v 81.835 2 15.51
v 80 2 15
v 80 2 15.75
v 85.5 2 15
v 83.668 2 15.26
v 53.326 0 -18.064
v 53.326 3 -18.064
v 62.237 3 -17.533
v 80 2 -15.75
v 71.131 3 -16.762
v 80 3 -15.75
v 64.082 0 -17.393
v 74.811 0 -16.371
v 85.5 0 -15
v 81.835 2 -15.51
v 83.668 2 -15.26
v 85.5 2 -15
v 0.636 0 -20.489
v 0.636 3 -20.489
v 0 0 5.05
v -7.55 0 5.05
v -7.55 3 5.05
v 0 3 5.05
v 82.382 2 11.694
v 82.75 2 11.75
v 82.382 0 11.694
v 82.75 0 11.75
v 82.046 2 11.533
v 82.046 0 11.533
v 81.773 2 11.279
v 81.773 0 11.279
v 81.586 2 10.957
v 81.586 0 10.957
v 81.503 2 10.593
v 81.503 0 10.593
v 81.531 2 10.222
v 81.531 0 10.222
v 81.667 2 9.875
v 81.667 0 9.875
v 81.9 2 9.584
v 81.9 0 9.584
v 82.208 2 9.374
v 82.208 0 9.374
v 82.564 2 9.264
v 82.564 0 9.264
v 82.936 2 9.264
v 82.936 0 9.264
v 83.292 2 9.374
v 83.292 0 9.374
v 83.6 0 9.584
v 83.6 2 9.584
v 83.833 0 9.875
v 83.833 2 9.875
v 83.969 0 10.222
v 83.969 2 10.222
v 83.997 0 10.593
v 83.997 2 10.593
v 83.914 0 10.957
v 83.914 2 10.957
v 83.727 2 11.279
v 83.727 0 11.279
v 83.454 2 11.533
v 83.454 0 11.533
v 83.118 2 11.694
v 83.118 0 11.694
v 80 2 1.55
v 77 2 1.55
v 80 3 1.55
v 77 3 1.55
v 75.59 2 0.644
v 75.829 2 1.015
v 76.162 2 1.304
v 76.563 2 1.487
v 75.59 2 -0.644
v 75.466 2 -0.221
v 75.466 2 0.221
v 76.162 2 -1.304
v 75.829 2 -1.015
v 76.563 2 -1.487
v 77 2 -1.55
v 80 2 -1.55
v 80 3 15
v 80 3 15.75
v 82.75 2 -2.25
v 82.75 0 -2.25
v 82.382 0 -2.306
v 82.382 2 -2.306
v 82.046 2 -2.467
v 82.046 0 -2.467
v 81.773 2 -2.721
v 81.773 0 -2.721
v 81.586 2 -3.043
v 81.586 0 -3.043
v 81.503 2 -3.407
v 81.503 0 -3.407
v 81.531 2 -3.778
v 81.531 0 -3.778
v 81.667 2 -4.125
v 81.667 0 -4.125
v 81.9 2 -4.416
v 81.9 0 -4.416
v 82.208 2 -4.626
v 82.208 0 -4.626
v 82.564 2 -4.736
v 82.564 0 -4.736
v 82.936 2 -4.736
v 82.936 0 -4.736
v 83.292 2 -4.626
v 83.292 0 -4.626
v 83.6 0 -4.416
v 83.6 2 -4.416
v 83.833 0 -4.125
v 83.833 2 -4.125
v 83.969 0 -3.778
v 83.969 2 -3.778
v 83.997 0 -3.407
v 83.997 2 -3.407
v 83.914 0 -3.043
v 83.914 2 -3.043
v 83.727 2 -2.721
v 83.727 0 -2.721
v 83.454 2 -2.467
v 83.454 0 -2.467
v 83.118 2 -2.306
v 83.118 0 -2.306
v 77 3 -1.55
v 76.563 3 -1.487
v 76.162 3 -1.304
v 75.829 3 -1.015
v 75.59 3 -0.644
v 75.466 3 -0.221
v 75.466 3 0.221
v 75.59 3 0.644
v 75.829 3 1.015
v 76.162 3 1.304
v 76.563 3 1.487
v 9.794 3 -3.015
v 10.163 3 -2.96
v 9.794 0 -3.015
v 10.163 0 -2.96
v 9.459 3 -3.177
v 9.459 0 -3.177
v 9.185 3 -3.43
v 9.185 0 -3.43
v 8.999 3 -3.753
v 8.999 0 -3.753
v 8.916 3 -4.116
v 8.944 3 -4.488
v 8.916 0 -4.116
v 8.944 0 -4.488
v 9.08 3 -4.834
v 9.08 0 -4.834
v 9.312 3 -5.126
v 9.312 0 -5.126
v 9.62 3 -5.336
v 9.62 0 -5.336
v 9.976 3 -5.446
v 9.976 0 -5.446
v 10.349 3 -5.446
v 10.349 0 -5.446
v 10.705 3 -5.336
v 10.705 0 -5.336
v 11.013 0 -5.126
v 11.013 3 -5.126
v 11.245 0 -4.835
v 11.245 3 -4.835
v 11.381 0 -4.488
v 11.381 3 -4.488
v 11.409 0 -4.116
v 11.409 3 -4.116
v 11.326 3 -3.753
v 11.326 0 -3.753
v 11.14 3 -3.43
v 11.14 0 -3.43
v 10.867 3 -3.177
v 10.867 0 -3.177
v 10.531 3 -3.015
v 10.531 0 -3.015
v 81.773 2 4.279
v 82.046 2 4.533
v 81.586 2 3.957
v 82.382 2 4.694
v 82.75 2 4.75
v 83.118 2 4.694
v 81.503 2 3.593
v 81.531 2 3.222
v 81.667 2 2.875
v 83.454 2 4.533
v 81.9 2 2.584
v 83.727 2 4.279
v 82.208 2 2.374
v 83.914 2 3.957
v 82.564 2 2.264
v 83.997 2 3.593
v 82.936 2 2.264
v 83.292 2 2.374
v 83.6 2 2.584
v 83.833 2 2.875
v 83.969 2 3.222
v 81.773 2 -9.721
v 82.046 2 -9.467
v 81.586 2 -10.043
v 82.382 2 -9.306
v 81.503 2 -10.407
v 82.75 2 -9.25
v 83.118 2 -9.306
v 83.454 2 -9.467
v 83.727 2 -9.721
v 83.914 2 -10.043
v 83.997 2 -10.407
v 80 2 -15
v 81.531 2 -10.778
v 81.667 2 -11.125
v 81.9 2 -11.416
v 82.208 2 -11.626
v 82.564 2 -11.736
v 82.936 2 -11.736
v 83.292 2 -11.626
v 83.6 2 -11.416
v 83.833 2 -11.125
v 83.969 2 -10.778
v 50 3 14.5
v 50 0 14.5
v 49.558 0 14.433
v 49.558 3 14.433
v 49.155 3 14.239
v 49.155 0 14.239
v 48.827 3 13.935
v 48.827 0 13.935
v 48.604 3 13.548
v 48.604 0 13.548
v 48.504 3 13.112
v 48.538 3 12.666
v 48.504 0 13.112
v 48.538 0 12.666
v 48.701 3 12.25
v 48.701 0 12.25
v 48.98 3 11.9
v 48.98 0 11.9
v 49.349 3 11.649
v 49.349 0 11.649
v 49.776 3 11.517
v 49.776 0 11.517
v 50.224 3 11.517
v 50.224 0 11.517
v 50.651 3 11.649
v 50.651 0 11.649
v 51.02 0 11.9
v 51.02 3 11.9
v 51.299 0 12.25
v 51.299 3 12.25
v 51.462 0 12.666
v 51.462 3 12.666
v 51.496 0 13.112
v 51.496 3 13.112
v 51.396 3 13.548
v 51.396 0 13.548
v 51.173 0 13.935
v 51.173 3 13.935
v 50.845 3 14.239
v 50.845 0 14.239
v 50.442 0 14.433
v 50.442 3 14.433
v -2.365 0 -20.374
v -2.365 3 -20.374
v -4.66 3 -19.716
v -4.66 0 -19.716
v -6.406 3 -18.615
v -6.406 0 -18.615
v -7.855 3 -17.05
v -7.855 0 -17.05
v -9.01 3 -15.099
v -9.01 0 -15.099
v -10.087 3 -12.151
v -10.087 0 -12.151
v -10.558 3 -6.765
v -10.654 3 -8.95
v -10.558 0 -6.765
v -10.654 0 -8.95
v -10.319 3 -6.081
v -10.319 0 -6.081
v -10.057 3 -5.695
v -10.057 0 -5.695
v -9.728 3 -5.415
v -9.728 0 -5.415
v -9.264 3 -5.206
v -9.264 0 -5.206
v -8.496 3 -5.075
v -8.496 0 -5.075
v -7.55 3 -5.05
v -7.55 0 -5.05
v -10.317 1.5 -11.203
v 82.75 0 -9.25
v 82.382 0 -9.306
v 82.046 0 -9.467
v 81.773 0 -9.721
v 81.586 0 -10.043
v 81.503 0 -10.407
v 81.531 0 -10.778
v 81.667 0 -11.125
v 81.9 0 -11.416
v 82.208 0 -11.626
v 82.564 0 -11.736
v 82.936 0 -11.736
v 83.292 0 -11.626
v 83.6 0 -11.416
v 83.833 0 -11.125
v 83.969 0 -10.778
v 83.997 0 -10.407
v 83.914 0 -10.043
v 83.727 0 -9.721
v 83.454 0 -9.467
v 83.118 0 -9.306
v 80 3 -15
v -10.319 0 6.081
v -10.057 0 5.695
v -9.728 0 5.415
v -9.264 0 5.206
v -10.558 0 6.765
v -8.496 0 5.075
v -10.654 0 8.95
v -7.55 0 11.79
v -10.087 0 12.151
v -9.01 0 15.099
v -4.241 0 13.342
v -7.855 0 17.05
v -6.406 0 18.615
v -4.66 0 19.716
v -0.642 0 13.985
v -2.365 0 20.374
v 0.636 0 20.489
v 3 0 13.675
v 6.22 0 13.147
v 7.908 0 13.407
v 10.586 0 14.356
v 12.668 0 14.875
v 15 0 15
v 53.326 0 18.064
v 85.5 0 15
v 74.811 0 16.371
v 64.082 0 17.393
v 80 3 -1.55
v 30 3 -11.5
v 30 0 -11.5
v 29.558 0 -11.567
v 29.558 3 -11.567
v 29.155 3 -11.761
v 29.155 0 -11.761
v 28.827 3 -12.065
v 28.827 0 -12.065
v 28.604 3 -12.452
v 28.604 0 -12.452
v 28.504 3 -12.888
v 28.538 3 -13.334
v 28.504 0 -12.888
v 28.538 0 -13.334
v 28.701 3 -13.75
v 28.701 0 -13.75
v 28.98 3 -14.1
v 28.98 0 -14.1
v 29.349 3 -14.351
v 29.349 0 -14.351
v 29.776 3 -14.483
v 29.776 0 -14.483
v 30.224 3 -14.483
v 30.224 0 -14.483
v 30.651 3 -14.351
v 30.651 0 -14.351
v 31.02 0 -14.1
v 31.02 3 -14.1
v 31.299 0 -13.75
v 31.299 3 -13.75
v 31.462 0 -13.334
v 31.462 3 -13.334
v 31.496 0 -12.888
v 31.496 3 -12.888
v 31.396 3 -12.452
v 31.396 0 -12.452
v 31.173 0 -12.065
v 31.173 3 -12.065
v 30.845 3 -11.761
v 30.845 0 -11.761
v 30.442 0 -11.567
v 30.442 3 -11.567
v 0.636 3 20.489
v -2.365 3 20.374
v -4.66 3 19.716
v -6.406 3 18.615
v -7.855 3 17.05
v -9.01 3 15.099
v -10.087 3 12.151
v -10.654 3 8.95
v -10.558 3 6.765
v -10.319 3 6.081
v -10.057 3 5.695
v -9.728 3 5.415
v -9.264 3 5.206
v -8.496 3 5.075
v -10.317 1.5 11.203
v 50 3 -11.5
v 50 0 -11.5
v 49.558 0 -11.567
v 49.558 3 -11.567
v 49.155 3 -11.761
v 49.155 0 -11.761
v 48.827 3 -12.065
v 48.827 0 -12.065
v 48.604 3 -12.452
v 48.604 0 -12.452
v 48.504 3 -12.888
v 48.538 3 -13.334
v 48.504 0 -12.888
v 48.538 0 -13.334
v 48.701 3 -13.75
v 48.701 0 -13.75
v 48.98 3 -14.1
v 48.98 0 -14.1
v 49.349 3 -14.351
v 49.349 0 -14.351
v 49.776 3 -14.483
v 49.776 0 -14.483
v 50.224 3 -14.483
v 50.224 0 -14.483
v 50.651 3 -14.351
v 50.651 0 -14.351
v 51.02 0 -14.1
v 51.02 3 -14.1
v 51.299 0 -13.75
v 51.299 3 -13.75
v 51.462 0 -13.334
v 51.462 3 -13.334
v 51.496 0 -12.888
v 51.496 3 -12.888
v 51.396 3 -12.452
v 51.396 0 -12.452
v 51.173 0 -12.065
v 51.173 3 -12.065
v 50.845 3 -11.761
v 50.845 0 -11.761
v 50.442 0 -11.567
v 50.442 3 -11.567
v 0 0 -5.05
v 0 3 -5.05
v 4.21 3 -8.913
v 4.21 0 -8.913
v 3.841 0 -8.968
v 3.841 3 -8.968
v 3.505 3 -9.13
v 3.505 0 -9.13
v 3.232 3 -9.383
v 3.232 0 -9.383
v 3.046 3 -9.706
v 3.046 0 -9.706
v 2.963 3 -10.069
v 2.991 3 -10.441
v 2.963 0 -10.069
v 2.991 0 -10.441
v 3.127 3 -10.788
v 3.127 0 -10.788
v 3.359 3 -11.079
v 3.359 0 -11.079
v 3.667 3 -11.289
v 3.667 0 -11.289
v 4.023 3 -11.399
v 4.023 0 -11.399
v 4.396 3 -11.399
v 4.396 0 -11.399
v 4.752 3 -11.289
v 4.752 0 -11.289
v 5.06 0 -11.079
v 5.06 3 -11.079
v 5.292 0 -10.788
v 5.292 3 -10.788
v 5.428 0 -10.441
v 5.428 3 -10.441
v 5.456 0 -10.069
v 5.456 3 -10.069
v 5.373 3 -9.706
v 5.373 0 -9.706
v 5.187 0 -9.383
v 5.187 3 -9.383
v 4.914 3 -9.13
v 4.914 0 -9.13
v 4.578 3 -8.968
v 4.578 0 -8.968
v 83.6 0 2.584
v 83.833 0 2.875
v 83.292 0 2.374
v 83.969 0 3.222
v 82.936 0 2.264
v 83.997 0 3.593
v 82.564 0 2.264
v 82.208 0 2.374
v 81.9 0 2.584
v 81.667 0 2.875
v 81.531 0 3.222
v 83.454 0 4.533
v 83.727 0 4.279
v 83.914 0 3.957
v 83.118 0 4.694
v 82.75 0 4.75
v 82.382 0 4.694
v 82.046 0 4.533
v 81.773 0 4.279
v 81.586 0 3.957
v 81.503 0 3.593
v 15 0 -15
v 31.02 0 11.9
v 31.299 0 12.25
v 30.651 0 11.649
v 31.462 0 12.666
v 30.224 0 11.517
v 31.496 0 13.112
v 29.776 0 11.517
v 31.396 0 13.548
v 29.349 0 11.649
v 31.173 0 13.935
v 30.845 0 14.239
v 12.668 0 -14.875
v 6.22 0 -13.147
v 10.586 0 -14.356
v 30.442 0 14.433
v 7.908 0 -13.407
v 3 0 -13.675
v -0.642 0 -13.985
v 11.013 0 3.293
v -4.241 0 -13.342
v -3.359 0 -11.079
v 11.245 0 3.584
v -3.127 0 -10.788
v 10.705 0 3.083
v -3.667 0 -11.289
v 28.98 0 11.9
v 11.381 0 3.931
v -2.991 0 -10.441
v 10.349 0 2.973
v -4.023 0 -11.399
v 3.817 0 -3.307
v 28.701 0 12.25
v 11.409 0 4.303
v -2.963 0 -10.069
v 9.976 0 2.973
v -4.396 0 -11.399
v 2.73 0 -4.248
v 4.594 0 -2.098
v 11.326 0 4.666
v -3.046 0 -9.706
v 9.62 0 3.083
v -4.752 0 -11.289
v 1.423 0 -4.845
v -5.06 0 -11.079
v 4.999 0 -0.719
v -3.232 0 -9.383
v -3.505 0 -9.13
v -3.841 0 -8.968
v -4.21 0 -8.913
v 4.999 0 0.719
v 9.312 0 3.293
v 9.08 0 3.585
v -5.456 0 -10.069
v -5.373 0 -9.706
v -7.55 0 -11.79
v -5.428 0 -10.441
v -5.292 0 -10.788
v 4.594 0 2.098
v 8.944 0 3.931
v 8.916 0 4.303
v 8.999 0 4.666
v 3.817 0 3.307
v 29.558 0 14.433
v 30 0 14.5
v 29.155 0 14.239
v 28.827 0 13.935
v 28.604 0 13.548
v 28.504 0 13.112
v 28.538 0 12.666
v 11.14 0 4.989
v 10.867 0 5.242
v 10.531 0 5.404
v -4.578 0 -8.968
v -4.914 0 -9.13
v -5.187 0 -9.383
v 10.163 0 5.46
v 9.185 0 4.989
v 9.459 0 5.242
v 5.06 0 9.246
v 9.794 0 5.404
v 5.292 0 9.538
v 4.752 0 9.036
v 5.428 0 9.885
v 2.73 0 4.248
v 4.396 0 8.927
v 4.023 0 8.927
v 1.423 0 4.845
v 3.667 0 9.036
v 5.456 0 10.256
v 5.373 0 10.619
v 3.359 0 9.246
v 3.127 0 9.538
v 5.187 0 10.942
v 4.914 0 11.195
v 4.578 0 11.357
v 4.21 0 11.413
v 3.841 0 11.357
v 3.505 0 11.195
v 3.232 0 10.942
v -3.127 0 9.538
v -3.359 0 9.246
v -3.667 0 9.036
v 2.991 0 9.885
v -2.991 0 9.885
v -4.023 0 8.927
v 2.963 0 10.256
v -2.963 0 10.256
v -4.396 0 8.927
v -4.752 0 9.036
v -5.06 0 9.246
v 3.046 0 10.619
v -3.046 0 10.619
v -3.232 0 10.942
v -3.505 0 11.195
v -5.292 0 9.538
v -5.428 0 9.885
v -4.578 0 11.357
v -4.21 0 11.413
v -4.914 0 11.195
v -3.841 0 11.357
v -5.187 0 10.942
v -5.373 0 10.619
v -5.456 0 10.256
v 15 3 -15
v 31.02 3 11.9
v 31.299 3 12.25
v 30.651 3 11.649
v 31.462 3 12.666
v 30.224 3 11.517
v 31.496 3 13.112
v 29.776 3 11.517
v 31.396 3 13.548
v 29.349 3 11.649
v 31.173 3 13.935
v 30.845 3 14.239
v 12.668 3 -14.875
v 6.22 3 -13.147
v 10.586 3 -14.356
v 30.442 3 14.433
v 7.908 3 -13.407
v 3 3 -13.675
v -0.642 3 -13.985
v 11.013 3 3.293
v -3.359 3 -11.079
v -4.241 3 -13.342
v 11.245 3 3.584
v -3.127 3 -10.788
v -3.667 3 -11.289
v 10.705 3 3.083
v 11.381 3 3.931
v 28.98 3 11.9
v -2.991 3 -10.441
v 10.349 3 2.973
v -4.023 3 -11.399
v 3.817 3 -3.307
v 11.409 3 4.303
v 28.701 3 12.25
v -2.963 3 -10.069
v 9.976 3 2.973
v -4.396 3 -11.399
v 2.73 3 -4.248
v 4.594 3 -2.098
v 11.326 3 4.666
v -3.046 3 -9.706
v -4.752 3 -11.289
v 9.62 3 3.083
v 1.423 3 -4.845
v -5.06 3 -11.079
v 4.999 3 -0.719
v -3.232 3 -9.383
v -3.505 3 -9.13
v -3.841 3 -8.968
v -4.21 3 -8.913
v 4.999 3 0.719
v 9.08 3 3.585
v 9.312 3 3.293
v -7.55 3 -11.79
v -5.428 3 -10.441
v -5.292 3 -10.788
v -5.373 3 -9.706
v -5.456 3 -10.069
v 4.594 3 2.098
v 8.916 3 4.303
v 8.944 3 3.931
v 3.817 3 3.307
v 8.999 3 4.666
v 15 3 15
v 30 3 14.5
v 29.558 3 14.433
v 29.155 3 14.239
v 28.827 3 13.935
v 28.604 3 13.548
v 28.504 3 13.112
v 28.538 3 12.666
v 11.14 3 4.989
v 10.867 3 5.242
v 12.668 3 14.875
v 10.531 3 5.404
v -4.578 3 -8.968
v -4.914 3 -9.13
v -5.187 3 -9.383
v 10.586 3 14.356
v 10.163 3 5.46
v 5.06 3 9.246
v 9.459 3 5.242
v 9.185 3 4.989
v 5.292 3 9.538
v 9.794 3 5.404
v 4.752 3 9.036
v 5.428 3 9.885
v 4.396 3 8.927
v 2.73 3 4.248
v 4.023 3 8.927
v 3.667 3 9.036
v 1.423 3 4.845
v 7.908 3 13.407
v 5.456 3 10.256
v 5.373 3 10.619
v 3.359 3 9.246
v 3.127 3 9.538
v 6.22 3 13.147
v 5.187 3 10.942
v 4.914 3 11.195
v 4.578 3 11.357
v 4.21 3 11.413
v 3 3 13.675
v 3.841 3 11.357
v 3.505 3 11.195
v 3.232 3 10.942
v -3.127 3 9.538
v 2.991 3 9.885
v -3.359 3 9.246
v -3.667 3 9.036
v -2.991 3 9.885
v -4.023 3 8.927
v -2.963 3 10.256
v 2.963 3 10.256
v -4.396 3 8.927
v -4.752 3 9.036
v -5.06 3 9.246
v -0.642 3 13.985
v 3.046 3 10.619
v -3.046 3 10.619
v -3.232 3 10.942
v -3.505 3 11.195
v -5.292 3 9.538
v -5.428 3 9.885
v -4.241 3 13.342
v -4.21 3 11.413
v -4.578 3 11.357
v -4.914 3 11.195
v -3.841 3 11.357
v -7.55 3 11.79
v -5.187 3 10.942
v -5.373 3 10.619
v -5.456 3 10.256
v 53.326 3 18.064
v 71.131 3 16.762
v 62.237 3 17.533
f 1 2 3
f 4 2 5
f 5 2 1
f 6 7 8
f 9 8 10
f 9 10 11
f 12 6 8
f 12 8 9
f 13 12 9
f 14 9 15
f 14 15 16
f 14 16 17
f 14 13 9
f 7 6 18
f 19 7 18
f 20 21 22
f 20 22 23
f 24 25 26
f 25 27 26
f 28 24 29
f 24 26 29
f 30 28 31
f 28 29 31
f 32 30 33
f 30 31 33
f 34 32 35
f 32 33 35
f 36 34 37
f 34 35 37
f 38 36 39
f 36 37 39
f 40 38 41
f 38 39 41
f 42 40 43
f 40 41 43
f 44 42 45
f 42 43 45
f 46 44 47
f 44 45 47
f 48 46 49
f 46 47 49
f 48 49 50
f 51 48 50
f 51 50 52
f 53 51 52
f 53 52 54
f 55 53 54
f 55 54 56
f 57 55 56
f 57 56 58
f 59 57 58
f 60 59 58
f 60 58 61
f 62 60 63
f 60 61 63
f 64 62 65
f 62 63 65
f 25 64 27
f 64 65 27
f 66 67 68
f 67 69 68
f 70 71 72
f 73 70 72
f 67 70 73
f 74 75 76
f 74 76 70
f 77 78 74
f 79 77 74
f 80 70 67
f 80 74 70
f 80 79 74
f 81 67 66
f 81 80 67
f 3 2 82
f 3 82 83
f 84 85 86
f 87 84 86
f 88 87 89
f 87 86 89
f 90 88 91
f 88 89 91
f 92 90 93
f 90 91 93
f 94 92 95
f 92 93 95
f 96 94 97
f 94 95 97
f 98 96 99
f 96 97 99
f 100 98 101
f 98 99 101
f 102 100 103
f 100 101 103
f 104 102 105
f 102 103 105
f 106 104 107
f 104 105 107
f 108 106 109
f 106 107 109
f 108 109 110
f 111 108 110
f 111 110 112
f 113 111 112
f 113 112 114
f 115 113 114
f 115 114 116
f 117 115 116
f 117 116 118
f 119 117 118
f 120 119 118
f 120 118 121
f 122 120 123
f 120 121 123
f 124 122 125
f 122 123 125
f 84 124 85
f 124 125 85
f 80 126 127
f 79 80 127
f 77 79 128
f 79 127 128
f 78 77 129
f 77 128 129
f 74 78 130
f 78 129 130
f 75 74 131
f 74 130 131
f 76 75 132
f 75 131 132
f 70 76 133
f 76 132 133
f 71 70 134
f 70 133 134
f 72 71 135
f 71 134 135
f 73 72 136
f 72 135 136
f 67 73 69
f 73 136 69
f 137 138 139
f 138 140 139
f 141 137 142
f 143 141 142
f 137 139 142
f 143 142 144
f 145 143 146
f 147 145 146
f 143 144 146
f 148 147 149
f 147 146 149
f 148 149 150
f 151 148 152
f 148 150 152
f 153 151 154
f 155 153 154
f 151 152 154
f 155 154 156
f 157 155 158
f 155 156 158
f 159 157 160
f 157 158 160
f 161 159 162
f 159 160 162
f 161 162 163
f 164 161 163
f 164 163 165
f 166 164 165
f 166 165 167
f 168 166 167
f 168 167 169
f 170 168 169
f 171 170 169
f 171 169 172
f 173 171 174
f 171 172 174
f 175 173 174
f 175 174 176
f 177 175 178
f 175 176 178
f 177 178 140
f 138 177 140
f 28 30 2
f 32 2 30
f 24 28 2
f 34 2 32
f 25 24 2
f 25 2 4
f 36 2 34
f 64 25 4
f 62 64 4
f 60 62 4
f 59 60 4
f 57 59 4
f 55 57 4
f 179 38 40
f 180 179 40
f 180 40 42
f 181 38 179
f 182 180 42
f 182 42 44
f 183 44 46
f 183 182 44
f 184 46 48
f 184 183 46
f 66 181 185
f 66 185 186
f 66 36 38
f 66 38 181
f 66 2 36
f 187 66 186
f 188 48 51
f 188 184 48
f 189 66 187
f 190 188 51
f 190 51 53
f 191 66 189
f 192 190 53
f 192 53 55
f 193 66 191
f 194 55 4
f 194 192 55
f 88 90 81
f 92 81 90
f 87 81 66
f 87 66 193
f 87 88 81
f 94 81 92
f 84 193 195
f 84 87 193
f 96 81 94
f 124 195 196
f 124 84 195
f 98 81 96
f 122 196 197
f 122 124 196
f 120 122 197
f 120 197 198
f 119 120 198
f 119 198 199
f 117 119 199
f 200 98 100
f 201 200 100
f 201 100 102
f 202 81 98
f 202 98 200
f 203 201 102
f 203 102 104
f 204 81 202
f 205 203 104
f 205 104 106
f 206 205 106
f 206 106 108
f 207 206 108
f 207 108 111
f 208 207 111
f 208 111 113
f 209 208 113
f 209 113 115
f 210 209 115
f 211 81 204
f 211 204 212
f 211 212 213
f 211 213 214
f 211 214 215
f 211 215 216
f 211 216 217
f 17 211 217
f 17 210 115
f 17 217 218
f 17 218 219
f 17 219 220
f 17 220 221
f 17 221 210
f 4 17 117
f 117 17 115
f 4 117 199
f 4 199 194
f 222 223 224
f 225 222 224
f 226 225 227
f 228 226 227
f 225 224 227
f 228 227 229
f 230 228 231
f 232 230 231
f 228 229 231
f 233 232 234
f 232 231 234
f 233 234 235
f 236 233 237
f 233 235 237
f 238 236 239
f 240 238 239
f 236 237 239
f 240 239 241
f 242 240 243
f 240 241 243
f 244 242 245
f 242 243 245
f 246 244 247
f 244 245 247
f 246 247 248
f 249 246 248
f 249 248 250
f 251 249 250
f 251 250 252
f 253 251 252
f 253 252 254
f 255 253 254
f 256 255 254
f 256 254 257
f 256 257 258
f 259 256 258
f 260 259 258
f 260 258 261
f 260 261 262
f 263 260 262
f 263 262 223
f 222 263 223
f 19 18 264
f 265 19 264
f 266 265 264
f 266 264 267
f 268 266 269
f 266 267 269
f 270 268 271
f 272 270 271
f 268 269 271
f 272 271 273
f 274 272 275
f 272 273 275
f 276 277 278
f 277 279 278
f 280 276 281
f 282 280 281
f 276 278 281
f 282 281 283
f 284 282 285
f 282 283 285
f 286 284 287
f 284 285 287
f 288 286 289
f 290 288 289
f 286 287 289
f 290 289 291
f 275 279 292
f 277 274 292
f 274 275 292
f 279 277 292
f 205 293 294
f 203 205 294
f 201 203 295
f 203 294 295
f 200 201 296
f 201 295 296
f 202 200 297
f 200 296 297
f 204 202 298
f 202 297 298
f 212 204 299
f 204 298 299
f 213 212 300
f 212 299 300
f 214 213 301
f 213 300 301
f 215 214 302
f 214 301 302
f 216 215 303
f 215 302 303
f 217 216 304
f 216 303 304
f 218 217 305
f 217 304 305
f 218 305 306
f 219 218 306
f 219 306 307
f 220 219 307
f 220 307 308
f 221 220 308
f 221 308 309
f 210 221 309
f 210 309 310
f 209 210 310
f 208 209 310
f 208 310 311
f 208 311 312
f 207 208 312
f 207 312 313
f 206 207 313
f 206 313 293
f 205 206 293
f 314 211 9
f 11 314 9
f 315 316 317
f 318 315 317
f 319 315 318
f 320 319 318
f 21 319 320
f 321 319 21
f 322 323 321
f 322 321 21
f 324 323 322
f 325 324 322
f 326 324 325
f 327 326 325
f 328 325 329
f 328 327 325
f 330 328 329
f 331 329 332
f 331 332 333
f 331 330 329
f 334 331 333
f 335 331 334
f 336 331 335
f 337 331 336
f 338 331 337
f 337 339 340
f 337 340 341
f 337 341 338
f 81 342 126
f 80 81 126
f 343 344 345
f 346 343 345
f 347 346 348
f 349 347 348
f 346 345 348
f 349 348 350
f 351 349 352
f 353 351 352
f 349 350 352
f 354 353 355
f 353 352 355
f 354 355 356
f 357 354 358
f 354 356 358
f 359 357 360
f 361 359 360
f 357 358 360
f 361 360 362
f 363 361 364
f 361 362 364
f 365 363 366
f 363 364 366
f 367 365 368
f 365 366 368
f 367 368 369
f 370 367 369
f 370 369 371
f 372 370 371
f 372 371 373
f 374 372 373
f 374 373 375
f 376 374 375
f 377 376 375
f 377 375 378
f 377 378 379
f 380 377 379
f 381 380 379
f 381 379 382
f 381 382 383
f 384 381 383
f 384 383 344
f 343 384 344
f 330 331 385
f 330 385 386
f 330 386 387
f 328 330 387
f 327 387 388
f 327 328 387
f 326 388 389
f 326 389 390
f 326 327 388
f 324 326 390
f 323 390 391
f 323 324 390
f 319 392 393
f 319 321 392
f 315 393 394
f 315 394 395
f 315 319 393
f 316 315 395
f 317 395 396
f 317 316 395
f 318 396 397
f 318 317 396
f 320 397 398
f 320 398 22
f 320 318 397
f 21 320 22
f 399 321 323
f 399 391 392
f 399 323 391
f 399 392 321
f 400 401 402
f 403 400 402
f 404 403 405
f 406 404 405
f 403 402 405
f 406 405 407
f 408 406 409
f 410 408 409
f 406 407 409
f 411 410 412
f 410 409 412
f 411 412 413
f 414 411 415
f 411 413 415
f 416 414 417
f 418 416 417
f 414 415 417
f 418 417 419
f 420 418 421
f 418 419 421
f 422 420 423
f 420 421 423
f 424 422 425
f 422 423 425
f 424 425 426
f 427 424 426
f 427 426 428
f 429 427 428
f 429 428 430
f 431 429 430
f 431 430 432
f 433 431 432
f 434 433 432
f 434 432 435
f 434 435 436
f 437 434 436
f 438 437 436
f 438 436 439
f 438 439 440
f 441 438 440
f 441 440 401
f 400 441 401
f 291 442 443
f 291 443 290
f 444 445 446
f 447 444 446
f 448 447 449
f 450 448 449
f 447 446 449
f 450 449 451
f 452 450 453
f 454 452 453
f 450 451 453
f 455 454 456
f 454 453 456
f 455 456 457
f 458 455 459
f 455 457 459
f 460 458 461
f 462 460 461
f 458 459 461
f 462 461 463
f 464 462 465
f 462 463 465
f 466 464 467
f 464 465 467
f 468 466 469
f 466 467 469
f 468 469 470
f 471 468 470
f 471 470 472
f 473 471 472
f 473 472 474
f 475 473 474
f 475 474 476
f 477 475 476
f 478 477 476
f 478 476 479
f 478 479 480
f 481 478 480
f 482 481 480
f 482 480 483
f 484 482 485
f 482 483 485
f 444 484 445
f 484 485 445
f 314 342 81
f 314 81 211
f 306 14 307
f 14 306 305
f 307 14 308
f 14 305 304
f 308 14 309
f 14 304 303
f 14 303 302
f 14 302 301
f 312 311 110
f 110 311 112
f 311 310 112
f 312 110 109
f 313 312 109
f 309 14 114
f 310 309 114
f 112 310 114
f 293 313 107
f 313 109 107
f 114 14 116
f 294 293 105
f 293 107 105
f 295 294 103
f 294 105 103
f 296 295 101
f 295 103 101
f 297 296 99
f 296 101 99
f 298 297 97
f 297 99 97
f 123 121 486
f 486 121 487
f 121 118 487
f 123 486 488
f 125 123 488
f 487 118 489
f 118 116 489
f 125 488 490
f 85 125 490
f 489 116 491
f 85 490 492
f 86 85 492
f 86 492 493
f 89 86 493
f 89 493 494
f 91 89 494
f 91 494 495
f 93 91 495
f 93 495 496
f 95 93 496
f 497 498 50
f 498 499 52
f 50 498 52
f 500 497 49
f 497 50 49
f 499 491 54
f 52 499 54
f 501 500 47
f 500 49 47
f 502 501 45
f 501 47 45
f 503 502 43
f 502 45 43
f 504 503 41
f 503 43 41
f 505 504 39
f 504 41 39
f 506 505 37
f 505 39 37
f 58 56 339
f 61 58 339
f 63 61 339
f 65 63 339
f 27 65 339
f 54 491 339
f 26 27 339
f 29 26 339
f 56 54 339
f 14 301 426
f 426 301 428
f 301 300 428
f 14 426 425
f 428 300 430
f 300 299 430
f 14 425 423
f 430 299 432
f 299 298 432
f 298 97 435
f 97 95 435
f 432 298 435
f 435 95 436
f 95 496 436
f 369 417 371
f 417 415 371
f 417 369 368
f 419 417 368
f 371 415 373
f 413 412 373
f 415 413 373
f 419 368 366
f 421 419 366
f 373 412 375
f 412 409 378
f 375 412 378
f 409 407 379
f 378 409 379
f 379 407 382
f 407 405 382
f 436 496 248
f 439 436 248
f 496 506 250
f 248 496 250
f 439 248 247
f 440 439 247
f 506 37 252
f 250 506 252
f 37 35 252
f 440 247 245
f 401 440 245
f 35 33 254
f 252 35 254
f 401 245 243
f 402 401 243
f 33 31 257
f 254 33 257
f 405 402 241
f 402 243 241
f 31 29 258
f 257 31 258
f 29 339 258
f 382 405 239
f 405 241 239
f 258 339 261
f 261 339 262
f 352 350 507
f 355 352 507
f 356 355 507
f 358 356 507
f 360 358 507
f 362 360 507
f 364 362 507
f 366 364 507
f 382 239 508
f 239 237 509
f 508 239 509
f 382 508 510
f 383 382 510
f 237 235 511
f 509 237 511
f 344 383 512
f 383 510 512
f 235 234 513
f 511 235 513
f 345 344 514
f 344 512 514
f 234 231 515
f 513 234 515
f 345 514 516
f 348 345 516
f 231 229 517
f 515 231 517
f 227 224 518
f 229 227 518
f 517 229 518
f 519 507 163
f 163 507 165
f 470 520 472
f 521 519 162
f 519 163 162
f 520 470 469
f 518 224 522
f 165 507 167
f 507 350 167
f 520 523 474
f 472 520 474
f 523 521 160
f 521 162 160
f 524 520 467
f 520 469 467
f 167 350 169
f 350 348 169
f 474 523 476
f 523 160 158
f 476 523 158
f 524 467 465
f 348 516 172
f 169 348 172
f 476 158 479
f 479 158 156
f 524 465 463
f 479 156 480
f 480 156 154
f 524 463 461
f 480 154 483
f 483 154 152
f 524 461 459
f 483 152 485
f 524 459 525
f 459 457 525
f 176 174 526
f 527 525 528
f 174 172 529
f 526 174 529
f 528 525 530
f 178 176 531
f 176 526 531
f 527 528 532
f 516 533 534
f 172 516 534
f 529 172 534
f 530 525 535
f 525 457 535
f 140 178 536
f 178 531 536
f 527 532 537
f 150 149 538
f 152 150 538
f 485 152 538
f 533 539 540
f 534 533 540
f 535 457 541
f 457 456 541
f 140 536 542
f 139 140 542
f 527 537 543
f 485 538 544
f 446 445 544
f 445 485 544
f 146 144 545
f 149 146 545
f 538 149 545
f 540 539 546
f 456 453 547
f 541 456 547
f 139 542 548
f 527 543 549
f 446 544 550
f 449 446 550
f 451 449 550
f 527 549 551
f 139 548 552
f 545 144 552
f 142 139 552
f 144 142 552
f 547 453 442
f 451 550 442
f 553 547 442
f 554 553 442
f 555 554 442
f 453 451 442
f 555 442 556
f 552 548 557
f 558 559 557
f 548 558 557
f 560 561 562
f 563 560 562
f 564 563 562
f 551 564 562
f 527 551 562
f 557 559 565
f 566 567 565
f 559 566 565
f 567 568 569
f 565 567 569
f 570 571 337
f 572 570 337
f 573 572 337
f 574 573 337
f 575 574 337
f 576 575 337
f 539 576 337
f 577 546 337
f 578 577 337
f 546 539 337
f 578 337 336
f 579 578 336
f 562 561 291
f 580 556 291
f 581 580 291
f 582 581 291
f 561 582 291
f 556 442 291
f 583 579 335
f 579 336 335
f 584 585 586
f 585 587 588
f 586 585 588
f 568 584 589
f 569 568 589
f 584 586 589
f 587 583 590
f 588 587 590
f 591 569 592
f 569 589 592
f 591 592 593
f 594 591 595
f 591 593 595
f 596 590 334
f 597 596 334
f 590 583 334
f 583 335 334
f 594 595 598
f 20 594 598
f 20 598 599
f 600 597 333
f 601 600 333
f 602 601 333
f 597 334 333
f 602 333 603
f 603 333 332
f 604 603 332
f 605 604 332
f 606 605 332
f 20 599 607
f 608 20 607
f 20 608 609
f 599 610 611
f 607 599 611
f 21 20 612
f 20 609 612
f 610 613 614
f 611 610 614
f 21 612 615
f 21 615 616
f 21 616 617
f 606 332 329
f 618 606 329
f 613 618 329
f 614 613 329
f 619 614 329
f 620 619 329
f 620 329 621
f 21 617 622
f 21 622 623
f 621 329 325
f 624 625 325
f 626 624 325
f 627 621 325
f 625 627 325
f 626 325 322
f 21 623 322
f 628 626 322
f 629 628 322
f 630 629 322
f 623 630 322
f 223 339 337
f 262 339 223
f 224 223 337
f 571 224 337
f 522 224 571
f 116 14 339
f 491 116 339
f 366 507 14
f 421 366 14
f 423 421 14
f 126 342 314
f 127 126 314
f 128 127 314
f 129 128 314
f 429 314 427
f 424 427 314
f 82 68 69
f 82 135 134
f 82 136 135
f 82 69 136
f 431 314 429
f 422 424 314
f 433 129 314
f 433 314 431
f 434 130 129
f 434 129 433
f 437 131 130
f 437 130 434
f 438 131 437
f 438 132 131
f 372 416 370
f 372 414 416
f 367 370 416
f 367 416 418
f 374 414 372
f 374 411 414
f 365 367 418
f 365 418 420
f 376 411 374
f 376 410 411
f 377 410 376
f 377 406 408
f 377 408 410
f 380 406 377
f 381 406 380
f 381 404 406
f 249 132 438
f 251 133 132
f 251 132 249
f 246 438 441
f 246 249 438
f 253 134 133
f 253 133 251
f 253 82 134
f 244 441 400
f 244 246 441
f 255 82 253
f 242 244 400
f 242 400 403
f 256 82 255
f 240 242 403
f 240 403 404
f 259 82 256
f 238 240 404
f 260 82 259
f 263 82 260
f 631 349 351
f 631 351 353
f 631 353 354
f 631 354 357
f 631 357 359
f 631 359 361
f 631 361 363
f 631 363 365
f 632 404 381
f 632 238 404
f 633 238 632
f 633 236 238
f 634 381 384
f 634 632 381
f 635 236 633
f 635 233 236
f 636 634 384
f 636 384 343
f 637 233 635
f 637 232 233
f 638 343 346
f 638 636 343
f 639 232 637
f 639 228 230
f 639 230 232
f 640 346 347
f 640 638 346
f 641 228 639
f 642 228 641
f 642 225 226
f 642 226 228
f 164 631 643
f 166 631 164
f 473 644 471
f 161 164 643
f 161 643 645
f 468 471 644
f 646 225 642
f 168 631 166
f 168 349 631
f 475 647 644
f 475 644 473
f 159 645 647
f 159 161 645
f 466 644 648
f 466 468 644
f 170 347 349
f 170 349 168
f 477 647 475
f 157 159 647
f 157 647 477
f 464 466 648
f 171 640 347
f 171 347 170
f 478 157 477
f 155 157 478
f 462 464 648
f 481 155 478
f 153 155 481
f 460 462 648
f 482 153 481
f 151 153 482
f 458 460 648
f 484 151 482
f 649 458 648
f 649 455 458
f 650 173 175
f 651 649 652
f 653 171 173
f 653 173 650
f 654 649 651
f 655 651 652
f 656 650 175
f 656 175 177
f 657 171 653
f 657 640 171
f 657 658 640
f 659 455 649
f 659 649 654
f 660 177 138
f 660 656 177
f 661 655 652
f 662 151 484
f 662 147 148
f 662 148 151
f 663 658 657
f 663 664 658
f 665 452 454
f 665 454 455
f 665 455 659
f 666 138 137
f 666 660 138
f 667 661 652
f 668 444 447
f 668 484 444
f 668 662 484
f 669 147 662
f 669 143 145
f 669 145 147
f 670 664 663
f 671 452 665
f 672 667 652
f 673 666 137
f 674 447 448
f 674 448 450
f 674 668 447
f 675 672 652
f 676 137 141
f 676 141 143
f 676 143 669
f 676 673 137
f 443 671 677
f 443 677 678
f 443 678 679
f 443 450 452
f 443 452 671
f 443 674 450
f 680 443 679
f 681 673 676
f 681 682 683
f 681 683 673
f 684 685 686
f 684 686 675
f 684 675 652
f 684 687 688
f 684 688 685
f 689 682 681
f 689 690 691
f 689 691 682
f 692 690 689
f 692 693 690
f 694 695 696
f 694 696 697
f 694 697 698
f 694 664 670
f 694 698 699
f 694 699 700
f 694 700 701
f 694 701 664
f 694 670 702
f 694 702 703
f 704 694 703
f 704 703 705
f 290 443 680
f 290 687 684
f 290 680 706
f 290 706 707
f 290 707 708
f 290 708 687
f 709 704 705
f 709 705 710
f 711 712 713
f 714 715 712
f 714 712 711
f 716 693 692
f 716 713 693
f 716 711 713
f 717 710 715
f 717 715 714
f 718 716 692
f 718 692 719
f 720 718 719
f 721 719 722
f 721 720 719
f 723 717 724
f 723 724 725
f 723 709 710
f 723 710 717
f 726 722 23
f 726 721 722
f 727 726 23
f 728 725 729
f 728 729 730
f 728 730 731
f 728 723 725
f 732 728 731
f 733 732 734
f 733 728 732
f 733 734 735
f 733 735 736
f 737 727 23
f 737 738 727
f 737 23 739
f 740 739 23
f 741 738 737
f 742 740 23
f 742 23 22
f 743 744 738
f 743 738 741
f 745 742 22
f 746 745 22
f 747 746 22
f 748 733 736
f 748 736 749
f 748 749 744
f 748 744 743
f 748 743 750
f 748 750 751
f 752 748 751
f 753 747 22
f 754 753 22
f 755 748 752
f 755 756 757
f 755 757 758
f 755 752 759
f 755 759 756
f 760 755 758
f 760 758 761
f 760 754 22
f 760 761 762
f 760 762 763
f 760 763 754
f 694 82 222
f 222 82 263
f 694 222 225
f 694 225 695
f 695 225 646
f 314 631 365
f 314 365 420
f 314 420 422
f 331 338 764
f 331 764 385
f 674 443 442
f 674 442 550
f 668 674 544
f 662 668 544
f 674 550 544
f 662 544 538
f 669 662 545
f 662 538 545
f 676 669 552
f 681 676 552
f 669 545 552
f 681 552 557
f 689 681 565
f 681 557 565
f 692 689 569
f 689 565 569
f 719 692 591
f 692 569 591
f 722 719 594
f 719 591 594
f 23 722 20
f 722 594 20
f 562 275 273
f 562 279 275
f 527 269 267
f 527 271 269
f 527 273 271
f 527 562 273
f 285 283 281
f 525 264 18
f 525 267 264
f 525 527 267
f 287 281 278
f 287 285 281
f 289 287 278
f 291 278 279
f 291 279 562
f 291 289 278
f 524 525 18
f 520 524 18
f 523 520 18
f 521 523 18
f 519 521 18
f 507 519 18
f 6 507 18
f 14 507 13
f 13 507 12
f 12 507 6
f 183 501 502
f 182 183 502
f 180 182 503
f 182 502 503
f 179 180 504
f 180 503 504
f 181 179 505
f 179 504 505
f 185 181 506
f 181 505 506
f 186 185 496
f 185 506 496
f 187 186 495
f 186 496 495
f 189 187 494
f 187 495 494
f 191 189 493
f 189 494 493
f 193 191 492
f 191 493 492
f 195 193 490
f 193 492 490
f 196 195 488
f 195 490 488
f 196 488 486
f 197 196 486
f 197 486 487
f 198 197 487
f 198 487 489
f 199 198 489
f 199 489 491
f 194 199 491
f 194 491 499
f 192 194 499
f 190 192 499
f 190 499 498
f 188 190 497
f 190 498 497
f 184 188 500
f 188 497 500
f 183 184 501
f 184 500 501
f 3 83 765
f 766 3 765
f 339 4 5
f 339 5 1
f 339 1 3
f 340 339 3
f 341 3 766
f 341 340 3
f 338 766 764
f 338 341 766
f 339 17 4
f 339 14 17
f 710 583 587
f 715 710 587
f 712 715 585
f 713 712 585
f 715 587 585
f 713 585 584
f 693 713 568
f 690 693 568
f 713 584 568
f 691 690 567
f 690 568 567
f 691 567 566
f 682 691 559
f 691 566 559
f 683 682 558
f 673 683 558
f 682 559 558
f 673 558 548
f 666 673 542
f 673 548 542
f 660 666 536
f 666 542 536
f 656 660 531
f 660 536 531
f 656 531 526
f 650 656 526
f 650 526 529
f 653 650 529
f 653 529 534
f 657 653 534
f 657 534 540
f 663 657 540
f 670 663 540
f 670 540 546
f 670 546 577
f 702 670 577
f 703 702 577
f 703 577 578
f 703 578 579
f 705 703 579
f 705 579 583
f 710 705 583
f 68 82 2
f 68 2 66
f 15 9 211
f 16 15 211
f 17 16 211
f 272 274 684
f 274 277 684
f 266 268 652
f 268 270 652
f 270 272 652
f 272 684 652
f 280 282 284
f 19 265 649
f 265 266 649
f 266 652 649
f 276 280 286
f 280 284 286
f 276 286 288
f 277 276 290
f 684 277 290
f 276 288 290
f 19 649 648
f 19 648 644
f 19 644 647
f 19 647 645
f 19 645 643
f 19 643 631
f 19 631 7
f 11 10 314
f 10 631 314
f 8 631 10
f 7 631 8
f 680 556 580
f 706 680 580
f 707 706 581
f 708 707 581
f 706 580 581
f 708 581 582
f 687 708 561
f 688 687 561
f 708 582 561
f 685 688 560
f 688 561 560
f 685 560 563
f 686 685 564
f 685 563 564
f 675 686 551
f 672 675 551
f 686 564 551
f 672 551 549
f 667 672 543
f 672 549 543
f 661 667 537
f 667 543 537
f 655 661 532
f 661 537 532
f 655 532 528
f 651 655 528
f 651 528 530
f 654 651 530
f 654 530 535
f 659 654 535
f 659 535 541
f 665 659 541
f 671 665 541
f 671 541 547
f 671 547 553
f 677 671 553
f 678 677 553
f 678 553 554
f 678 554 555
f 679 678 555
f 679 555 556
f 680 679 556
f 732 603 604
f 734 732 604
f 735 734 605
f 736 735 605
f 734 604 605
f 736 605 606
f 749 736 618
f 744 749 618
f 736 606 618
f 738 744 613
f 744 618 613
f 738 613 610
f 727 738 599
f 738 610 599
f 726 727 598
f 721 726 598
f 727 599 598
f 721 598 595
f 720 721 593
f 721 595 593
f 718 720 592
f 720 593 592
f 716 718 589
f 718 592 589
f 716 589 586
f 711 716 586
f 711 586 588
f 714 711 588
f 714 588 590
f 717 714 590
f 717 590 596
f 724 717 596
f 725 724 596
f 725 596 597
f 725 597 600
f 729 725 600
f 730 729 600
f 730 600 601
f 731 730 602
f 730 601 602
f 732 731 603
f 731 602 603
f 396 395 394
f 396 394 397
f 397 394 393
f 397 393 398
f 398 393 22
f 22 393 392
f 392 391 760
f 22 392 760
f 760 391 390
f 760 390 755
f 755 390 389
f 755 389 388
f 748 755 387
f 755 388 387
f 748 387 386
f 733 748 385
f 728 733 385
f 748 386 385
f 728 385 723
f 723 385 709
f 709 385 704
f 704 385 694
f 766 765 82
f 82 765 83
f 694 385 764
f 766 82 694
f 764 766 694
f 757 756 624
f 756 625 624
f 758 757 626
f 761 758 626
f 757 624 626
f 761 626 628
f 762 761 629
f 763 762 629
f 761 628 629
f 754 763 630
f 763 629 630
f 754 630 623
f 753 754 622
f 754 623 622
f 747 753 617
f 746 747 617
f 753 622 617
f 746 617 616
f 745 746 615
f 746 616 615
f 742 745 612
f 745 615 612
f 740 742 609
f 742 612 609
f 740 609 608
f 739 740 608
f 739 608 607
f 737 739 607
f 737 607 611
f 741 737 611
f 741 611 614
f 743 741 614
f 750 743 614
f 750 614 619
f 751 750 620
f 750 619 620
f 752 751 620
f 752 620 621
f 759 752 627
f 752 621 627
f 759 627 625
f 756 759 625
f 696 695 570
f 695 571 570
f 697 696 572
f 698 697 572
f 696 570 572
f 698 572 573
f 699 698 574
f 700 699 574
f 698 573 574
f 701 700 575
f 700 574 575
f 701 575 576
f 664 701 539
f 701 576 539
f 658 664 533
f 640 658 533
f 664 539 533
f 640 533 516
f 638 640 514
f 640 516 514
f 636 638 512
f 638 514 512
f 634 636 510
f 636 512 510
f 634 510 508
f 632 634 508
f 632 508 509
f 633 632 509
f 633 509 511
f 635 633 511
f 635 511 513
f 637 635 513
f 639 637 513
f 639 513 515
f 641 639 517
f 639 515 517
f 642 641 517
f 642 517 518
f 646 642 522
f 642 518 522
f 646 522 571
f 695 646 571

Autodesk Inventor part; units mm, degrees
ref_plane "YZ Plane" through (0, 0, 0) normal (1, 0, 0) x (0, 1, 0)
ref_plane "XZ Plane" through (0, 0, 0) normal (0, 1, 0) x (-1, 0, 0)
ref_plane "XY Plane" through (0, 0, 0) normal (0, 0, 1) x (1, 0, 0)
sketch "Sketch1" plane through (0, 0, 0) normal (0, 1, 0) x (-1, 0, 0)
  line L0 (-85.5, 15) -> (0, 15) construction
  line L1 (16, 15) -> (16, -15) construction
  line L2 (16, -15) -> (0, -15) construction
  line L3 (-85.5, -15) -> (-85.5, 15)
  line L4 (16, 0) -> (-42.75, 0) construction
  line L5 (-28.4, 0) -> (23.4, 0) construction
  circle A0 centre (0, 0) radius 11 construction
  line L6 (11, 12.5) -> (11, -13.4099) construction
  circle A1 centre (0, 0) radius 5.05 construction
  line L7 (0, 5.05) -> (7.55, 5.05) construction
  line L8 (0, -5.05) -> (7.55, -5.05) construction
  line L9 (16, 15) -> (16, 5) construction
  line L10 (16, -5) -> (16, -15) construction
  arc A2 (0, 5.05) -> (0, -5.05) centre (0, 0) ccw
  circle A3 centre (0, 0) radius 15 construction
  arc A4 (0, -15) -> (14.1421, -5) centre (0, 0) ccw construction
  arc A5 (14.1421, 5) -> (0, 15) centre (0, 0) ccw construction
  line L11 (0, -15) -> (-85.5, -15) construction
  line L12 (0, 15) -> (16, 15) construction
  arc A6 (11, -8.6603) -> (11, 8.6603) centre (0, 0) ccw construction
  line L13 (-3, -24.7441) -> (-3, 29.6212) construction
  arc A7 (-3, -13.6748) -> (7.55, -11.7897) centre (0, 0) ccw
  line L14 (7.55, 5.05) -> (0, 5.05)
  line L15 (-15, -18.6523) -> (-15, 18.2394) construction
  line L16 (-85.5, -15) -> (-15, -15)
  line L17 (-85.5, 15) -> (-15, 15)
  spline S0 degree 4 poles (-3, -13.6748) (-4.5129, -13.3429) (-7.4407, -12.2328) (-10.459, -15) (-13.4863, -15) (-15, -15) knots 0 0 0 0 0 0.5 1 1 1 1 1
  spline S1 degree 4 poles (-3, 13.6748) (-4.5129, 13.3429) (-7.4407, 12.2328) (-10.459, 15) (-13.4863, 15) (-15, 15) knots 0 0 0 0 0 0.5 1 1 1 1 1
  line L18 (5.05, -20.2789) -> (5.05, 16.2453) construction
  line L19 (7.55, -11.7897) -> (7.55, -5.05)
  line L20 (7.55, 5.05) -> (7.55, 11.7897)
  line L21 (7.55, -5.05) -> (11, -5.05) construction
  line L22 (7.55, 5.05) -> (9.7723, 5.05) construction
  arc A8 (7.55, 11.7897) -> (7.55, -11.7897) centre (0, 0) ccw construction
  arc A9 (7.55, 11.7897) -> (-3, 13.6748) centre (0, 0) ccw
  line L23 (0, -5.05) -> (7.55, -5.05)
  line L24 (0, -35.9242) -> (0, 40.5454) construction
  line L25 (45.18, 0) -> (-107.28, 0) projected
  line L26 (-42.75, 0) -> (-85.5, 0) construction
  line L27 (-85.5, 0) -> (-44.5655, 0)
  line L28 (-85.5, 0) -> (-37.398, 0)
  line L29 (-37.398, 0) -> (-37.398, -25) construction
  line L30 (-85.5, 15) -> (-85.5, -25) construction
  line L31 (-85.5, -25) -> (-37.398, -25) construction
  point P0 (13.0767, -5)
  point P1 (13.0767, 5)
  dimension "d1" = 22
  dimension "d0" = 30
  dimension "d2" = 85.5
  dimension "d3" = 10.1
  dimension "d4" = 30
  dimension "d5" = 28
  dimension "d6" = 15
  dimension "d7" = 12
  dimension "d8" = 2.5
  dimension "d76" = 48.102
  dimension "d77" = 40
extrude "Extrusion1" add sketch "Sketch1" along normal blind 3
sketch "Sketch2" plane through (0, 3, 0) normal (0, 1, 0) x (1, 0, 0)
  circle A0 centre (0, 0) radius 11 construction
  line L0 (-30.3, 0) -> (104.8, 0) construction
  line L1 (0, 21) -> (0, -21) construction
  line L2 (0, 0) -> (-4.2095, -10.1627) construction
  point P0 (-4.2095, -10.1627)
  point P1 (4.2095, -10.1627)
  point P2 (10.1627, -4.2095)
  point P3 (10.1627, 4.2095)
  point P4 (4.2095, 10.1627)
  point P5 (-4.2095, 10.1627)
  dimension "d19" = 22
  dimension "d20" = 225
  dimension "d78" = 22.5
hole "Hole1" at (-4.2095, 3, 10.1627) at (-4.2095, 3, -10.1627) at (4.2095, 3, -10.1627) at (10.1627, 3, -4.2095) at (10.1627, 3, 4.2095) at (4.2095, 3, 10.1627) direction (0, -1, 0) diameter 2.5 end through all
sketch "Sketch3" plane through (0, 3, 0) normal (0, 1, 0) x (1, 0, 0)
  circle A0 centre (-4.2095, -10.1627) radius 1.25 construction
  circle A1 centre (4.2095, -10.1627) radius 1.25 construction
  circle A2 centre (10.1627, -4.2095) radius 1.25 construction
  circle A3 centre (10.1627, 4.2095) radius 1.25 construction
  circle A4 centre (4.2095, 10.1627) radius 1.25 construction
  circle A5 centre (-4.2095, 10.1627) radius 1.25 construction
  point P0 (0, 0)
sketch "Sketch4" plane through (0, 3, 0) normal (0, 1, 0) x (1, 0, 0)
  line L0 (82.75, -15) -> (82.75, 10.5) construction
  line L1 (85.5, -15) -> (85.5, 15) construction
  line L2 (15, -15) -> (85.5, -15) construction
  point P0 (0, 0)
  point P1 (82.75, -10.5)
  point P2 (82.75, -3.5)
  point P3 (82.75, 3.5)
  dimension "d29" = 2.75
  dimension "d30" = 4.5
  dimension "d33" = 7
hole "Hole2" at (82.75, 3, 10.5) at (82.75, 3, 3.5) at (82.75, 3, -3.5) at (82.75, 3, -10.5) direction (0, -1, 0) diameter 2.5 end through all
sketch "Sketch6" plane through (0, 3, 0) normal (0, 1, 0) x (1, 0, 0)
  line L0 (15, -15) -> (85.5, -15) projected
  line L1 (80, -15) -> (80, 15)
  line L2 (80, 15) -> (85.5, 15)
  line L3 (85.5, 15) -> (85.5, -15)
  line L4 (85.5, -15) -> (85.5, -15)
  line L5 (80, -15) -> (80, -15)
  line L6 (80, -15) -> (85.5, -15)
  line L7 (85.5, 15) -> (15, 15) projected
  line L8 (85.5, -15) -> (85.5, 15) projected
  point P0 (0, 0)
  dimension "d47" = 5.5
extrude "Extrusion2" cut sketch "Sketch6" against normal blind 1
sketch "Sketch7" plane through (0, 3, 0) normal (0, 1, 0) x (1, 0, 0)
  line L0 (-7.55, -13) -> (80, -13) construction
  line L1 (-7.55, 13) -> (80, 13) construction
  line L2 (80, -15) -> (80, 15) construction
  line L3 (80, 15) -> (15, 15) construction
  arc A0 (3, 13.6748) -> (-7.55, 11.7897) centre (0, 0) ccw construction
  line L4 (-7.55, 11.7897) -> (-7.55, 5.05) construction
  line L5 (-7.55, 5.05) -> (0, 5.05) construction
  arc A1 (0, -5.05) -> (0, 5.05) centre (0, 0) ccw construction
  line L6 (0, -5.05) -> (-7.55, -5.05) construction
  line L7 (-7.55, -5.05) -> (-7.55, -11.7897) construction
  arc A2 (-7.55, -11.7897) -> (3, -13.6748) centre (0, 0) ccw construction
  line L8 (15, -15) -> (80, -15) construction
  circle A3 centre (10.1627, -4.2095) radius 1.25 construction
  circle A4 centre (4.2095, 10.1627) radius 1.25 construction
  circle A5 centre (-4.2095, -10.1627) radius 1.25 construction
  circle A6 centre (-4.2095, 10.1627) radius 1.25 construction
  circle A7 centre (10.1627, 4.2095) radius 1.25 construction
  circle A8 centre (4.2095, -10.1627) radius 1.25 construction
  line L9 (30, -13) -> (30, 13) construction
  line L10 (50, -13) -> (50, 13) construction
  line L11 (-7.55, -5.05) -> (-7.55, -11.7897) projected
  line L12 (-7.55, 11.7897) -> (-7.55, 5.05) projected
  line L13 (80, -15) -> (80, 15) projected
  dimension "d50" = 2
  dimension "d51" = 2
  dimension "d52" = 30
  dimension "d53" = 20
hole "Hole3" at (30, 3, 13) at (30, 3, -13) at (50, 3, 13) at (50, 3, -13) direction (0, -1, 0) diameter 3 end through all
sketch "Sketch9" plane through (0, 0, 0) normal (0, -1, 0) x (1, 0, 0)
  circle A0 centre (50, 13) radius 1.5 projected
  circle A1 centre (30, 13) radius 1.5 projected
  circle A2 centre (30, -13) radius 1.5 projected
  circle A3 centre (50, -13) radius 1.5 projected
  circle A4 centre (82.75, -3.5) radius 1.25 projected
  circle A5 centre (82.75, 10.5) radius 1.25 projected
  circle A6 centre (82.75, 3.5) radius 1.25 projected
  circle A7 centre (82.75, -10.5) radius 1.25 projected
  circle A8 centre (10.1627, 4.2095) radius 1.25 projected
  circle A9 centre (4.2095, -10.1627) radius 1.25 projected
  circle A10 centre (-4.2095, 10.1627) radius 1.25 projected
  circle A11 centre (-4.2095, -10.1627) radius 1.25 projected
  circle A12 centre (10.1627, -4.2095) radius 1.25 projected
  circle A13 centre (4.2095, 10.1627) radius 1.25 projected
  line L0 (85.5, -15) -> (85.5, 15) projected
  line L1 (85.5, 15) -> (15, 15) projected
  spline S0 degree 4 poles (15, 15) (13.4863, 15) (10.459, 15) (7.4407, 12.2328) (4.5129, 13.3429) (3, 13.6748) knots 0 0 0 0 0 0.5 1 1 1 1 1 projected
  arc A14 (3, 13.6748) -> (-7.55, 11.7897) centre (0, 0) ccw projected
  line L2 (-7.55, 11.7897) -> (-7.55, 5.05) projected
  line L3 (-7.55, 5.05) -> (0, 5.05) projected
  arc A15 (0, -5.05) -> (0, 5.05) centre (0, 0) ccw projected
  line L4 (0, -5.05) -> (-7.55, -5.05) projected
  line L5 (-7.55, -5.05) -> (-7.55, -11.7897) projected
  arc A16 (-7.55, -11.7897) -> (3, -13.6748) centre (0, 0) ccw projected
  spline S1 degree 4 poles (3, -13.6748) (4.5129, -13.3429) (7.4407, -12.2328) (10.459, -15) (13.4863, -15) (15, -15) knots 0 0 0 0 0 0.5 1 1 1 1 1 projected
  line L6 (15, -15) -> (85.5, -15) projected
  line L7 (-33.5183, 0) -> (105.3801, 0) construction
  line L8 (53.3261, -18.0641) -> (0.6359, -20.4888)
  spline S2 degree 4 poles (0.6359, -20.4888) (-4.0309, -20.7036) (-10.0323, -18.8785) (-12.1817, -5.2973) (-9.7602, -5.05) (-7.55, -5.05) knots 0 0 0 0 0 0.549784 1 1 1 1 1
  line L9 (15, -15) -> (85.5, -15) projected
  arc A17 (53.3261, -18.0641) -> (85.5, -15) centre (38.1482, 311.7572) ccw
  line L10 (85.5, 15) -> (15, 15) projected
  line L11 (-11.2901, -5.05) -> (-3.8099, -5.05) construction
  arc A18 (-4.5618, -5.1264) -> (-10.5382, -5.1264) centre (-7.55, -63.5612) ccw construction
  line L12 (-7.55, -5.05) -> (0, -5.05) projected
  line L13 (3.8326, -20.3417) -> (-2.5609, -20.6359) construction
  arc A19 (-1.9144, -20.4771) -> (3.1743, -20.2429) centre (-0.5233, 4.7003) ccw construction
  line L14 (0, 5.05) -> (-7.55, 5.05) projected
  spline S3 degree 4 poles (0.6359, 20.4888) (-4.0309, 20.7036) (-10.0323, 18.8785) (-12.1817, 5.2973) (-9.7602, 5.05) (-7.55, 5.05) knots 0 0 0 0 0 0.549784 1 1 1 1 1
  line L15 (53.3261, 18.0641) -> (0.6359, 20.4888)
  arc A20 (85.5, 15) -> (53.3261, 18.0641) centre (38.1482, -311.7572) ccw
  line L16 (-11.2901, 5.05) -> (-3.8099, 5.05) construction
  arc A21 (-10.5382, 5.1264) -> (-4.5618, 5.1264) centre (-7.55, 63.5612) ccw construction
  line L17 (3.8326, 20.3417) -> (-2.5609, 20.6359) construction
  arc A22 (3.1743, 20.2429) -> (-1.9144, 20.4771) centre (-0.5233, -4.7003) ccw construction
  point P0 (-8.9748, -15.1711)
  point P1 (-10.2976, -6.0407)
  point P2 (-8.9748, 15.1711)
  point P3 (-10.2976, 6.0407)
extrude "Extrusion6" add sketch "Sketch9" against normal blind 3 contours A17 L8 S2 L5 A16 S1 L6 | L1 S0 A14 L2 S3 L15 A20
sketch "Sketch8" plane through (0, 3, 0) normal (0, 1, 0) x (1, 0, 0)
  line L0 (-26.16, 0) -> (104.11, 0) construction
  line L1 (80, -15) -> (80, 15) construction
  line L2 (77, -1.55) -> (80, -1.55)
  line L3 (80, -1.55) -> (80, 1.55)
  line L4 (80, 1.55) -> (77, 1.55)
  line L5 (77, 1.55) -> (77, -1.55) construction
  line L6 (77, -1.55) -> (80, 1.55) construction
  line L7 (80, -1.55) -> (77, 1.55) construction
  arc A0 (77, 1.55) -> (77, -1.55) centre (77, 0) ccw
  point P0 (0, 0)
  point P1 (78.5, 0)
  dimension "d61" = 3
  dimension "d62" = 3.1
extrude "Extrusion3" cut sketch "Sketch8" against normal blind 1
sketch "Sketch10" plane through (0, 2, 0) normal (0, 1, 0) x (1, 0, 0)
  circle A0 centre (82.75, 3.5) radius 1.25 projected
  circle A1 centre (82.75, -10.5) radius 1.25 projected
  circle A2 centre (82.75, -3.5) radius 1.25 projected
  circle A3 centre (82.75, 10.5) radius 1.25 projected
  line L0 (85.5, 15) -> (85.5, -15) projected
  line L1 (80, 15) -> (85.5, 15) projected
  line L2 (80, 1.55) -> (80, 15) projected
  line L3 (77, 1.55) -> (80, 1.55) projected
  arc A4 (77, 1.55) -> (77, -1.55) centre (77, 0) ccw projected
  line L4 (80, -1.55) -> (77, -1.55) projected
  line L5 (80, -15) -> (80, -1.55) projected
  line L6 (85.5, -15) -> (80, -15) projected
  line L7 (80, -15) -> (80, -15.7499)
  line L8 (80, -15.7499) -> (85.5, -15.7499)
  line L9 (85.5, 15) -> (85.5, -15) projected
  line L10 (85.5, -15.7499) -> (85.5, -15)
  line L11 (-31.7181, 0) -> (105.0363, 0) construction
  line L12 (80, 15) -> (80, 15.7499)
  line L13 (80, 15.7499) -> (85.5, 15.7499)
  line L14 (85.5, 15.7499) -> (85.5, 15)
  arc A5 (53.3261, -18.0641) -> (85.5, -15) centre (38.1482, 311.7572) ccw projected
  point P0 (0, 0)
extrude "Extrusion7" cut sketch "Sketch10" along normal blind 1 contours L1 L12 L13 L14 | A5 L7 L6 | L10 L8 A5
ref_plane "Work Plane1" through (-10.6877, 1.5, -8.1148) normal (-1, 0, 0) x (0, -1, 0)
equation "\"d3\" = d12 + diameter_tol"
equation "\"d19\" = d21"
equation "\"d29\" = hole_2_bottom"
equation "\"d47\" = border_thickness"
equation "\"d10\" = 22"
equation "\"d12\" = 10"
equation "\"d14\" = 2 * d13"
equation "\"base_width\" = 6.25"
equation "\"d21\" = 22"
equation "\"diameter_tol\" = 0.1"
equation "\"border_thickness\" = 5.5"
equation "\"hole_2_bottom\" = 2.75"
equation "\"d13\" = 3"
properties part number "new_side_u106_long_design" material "Aluminum 2014-T4"
